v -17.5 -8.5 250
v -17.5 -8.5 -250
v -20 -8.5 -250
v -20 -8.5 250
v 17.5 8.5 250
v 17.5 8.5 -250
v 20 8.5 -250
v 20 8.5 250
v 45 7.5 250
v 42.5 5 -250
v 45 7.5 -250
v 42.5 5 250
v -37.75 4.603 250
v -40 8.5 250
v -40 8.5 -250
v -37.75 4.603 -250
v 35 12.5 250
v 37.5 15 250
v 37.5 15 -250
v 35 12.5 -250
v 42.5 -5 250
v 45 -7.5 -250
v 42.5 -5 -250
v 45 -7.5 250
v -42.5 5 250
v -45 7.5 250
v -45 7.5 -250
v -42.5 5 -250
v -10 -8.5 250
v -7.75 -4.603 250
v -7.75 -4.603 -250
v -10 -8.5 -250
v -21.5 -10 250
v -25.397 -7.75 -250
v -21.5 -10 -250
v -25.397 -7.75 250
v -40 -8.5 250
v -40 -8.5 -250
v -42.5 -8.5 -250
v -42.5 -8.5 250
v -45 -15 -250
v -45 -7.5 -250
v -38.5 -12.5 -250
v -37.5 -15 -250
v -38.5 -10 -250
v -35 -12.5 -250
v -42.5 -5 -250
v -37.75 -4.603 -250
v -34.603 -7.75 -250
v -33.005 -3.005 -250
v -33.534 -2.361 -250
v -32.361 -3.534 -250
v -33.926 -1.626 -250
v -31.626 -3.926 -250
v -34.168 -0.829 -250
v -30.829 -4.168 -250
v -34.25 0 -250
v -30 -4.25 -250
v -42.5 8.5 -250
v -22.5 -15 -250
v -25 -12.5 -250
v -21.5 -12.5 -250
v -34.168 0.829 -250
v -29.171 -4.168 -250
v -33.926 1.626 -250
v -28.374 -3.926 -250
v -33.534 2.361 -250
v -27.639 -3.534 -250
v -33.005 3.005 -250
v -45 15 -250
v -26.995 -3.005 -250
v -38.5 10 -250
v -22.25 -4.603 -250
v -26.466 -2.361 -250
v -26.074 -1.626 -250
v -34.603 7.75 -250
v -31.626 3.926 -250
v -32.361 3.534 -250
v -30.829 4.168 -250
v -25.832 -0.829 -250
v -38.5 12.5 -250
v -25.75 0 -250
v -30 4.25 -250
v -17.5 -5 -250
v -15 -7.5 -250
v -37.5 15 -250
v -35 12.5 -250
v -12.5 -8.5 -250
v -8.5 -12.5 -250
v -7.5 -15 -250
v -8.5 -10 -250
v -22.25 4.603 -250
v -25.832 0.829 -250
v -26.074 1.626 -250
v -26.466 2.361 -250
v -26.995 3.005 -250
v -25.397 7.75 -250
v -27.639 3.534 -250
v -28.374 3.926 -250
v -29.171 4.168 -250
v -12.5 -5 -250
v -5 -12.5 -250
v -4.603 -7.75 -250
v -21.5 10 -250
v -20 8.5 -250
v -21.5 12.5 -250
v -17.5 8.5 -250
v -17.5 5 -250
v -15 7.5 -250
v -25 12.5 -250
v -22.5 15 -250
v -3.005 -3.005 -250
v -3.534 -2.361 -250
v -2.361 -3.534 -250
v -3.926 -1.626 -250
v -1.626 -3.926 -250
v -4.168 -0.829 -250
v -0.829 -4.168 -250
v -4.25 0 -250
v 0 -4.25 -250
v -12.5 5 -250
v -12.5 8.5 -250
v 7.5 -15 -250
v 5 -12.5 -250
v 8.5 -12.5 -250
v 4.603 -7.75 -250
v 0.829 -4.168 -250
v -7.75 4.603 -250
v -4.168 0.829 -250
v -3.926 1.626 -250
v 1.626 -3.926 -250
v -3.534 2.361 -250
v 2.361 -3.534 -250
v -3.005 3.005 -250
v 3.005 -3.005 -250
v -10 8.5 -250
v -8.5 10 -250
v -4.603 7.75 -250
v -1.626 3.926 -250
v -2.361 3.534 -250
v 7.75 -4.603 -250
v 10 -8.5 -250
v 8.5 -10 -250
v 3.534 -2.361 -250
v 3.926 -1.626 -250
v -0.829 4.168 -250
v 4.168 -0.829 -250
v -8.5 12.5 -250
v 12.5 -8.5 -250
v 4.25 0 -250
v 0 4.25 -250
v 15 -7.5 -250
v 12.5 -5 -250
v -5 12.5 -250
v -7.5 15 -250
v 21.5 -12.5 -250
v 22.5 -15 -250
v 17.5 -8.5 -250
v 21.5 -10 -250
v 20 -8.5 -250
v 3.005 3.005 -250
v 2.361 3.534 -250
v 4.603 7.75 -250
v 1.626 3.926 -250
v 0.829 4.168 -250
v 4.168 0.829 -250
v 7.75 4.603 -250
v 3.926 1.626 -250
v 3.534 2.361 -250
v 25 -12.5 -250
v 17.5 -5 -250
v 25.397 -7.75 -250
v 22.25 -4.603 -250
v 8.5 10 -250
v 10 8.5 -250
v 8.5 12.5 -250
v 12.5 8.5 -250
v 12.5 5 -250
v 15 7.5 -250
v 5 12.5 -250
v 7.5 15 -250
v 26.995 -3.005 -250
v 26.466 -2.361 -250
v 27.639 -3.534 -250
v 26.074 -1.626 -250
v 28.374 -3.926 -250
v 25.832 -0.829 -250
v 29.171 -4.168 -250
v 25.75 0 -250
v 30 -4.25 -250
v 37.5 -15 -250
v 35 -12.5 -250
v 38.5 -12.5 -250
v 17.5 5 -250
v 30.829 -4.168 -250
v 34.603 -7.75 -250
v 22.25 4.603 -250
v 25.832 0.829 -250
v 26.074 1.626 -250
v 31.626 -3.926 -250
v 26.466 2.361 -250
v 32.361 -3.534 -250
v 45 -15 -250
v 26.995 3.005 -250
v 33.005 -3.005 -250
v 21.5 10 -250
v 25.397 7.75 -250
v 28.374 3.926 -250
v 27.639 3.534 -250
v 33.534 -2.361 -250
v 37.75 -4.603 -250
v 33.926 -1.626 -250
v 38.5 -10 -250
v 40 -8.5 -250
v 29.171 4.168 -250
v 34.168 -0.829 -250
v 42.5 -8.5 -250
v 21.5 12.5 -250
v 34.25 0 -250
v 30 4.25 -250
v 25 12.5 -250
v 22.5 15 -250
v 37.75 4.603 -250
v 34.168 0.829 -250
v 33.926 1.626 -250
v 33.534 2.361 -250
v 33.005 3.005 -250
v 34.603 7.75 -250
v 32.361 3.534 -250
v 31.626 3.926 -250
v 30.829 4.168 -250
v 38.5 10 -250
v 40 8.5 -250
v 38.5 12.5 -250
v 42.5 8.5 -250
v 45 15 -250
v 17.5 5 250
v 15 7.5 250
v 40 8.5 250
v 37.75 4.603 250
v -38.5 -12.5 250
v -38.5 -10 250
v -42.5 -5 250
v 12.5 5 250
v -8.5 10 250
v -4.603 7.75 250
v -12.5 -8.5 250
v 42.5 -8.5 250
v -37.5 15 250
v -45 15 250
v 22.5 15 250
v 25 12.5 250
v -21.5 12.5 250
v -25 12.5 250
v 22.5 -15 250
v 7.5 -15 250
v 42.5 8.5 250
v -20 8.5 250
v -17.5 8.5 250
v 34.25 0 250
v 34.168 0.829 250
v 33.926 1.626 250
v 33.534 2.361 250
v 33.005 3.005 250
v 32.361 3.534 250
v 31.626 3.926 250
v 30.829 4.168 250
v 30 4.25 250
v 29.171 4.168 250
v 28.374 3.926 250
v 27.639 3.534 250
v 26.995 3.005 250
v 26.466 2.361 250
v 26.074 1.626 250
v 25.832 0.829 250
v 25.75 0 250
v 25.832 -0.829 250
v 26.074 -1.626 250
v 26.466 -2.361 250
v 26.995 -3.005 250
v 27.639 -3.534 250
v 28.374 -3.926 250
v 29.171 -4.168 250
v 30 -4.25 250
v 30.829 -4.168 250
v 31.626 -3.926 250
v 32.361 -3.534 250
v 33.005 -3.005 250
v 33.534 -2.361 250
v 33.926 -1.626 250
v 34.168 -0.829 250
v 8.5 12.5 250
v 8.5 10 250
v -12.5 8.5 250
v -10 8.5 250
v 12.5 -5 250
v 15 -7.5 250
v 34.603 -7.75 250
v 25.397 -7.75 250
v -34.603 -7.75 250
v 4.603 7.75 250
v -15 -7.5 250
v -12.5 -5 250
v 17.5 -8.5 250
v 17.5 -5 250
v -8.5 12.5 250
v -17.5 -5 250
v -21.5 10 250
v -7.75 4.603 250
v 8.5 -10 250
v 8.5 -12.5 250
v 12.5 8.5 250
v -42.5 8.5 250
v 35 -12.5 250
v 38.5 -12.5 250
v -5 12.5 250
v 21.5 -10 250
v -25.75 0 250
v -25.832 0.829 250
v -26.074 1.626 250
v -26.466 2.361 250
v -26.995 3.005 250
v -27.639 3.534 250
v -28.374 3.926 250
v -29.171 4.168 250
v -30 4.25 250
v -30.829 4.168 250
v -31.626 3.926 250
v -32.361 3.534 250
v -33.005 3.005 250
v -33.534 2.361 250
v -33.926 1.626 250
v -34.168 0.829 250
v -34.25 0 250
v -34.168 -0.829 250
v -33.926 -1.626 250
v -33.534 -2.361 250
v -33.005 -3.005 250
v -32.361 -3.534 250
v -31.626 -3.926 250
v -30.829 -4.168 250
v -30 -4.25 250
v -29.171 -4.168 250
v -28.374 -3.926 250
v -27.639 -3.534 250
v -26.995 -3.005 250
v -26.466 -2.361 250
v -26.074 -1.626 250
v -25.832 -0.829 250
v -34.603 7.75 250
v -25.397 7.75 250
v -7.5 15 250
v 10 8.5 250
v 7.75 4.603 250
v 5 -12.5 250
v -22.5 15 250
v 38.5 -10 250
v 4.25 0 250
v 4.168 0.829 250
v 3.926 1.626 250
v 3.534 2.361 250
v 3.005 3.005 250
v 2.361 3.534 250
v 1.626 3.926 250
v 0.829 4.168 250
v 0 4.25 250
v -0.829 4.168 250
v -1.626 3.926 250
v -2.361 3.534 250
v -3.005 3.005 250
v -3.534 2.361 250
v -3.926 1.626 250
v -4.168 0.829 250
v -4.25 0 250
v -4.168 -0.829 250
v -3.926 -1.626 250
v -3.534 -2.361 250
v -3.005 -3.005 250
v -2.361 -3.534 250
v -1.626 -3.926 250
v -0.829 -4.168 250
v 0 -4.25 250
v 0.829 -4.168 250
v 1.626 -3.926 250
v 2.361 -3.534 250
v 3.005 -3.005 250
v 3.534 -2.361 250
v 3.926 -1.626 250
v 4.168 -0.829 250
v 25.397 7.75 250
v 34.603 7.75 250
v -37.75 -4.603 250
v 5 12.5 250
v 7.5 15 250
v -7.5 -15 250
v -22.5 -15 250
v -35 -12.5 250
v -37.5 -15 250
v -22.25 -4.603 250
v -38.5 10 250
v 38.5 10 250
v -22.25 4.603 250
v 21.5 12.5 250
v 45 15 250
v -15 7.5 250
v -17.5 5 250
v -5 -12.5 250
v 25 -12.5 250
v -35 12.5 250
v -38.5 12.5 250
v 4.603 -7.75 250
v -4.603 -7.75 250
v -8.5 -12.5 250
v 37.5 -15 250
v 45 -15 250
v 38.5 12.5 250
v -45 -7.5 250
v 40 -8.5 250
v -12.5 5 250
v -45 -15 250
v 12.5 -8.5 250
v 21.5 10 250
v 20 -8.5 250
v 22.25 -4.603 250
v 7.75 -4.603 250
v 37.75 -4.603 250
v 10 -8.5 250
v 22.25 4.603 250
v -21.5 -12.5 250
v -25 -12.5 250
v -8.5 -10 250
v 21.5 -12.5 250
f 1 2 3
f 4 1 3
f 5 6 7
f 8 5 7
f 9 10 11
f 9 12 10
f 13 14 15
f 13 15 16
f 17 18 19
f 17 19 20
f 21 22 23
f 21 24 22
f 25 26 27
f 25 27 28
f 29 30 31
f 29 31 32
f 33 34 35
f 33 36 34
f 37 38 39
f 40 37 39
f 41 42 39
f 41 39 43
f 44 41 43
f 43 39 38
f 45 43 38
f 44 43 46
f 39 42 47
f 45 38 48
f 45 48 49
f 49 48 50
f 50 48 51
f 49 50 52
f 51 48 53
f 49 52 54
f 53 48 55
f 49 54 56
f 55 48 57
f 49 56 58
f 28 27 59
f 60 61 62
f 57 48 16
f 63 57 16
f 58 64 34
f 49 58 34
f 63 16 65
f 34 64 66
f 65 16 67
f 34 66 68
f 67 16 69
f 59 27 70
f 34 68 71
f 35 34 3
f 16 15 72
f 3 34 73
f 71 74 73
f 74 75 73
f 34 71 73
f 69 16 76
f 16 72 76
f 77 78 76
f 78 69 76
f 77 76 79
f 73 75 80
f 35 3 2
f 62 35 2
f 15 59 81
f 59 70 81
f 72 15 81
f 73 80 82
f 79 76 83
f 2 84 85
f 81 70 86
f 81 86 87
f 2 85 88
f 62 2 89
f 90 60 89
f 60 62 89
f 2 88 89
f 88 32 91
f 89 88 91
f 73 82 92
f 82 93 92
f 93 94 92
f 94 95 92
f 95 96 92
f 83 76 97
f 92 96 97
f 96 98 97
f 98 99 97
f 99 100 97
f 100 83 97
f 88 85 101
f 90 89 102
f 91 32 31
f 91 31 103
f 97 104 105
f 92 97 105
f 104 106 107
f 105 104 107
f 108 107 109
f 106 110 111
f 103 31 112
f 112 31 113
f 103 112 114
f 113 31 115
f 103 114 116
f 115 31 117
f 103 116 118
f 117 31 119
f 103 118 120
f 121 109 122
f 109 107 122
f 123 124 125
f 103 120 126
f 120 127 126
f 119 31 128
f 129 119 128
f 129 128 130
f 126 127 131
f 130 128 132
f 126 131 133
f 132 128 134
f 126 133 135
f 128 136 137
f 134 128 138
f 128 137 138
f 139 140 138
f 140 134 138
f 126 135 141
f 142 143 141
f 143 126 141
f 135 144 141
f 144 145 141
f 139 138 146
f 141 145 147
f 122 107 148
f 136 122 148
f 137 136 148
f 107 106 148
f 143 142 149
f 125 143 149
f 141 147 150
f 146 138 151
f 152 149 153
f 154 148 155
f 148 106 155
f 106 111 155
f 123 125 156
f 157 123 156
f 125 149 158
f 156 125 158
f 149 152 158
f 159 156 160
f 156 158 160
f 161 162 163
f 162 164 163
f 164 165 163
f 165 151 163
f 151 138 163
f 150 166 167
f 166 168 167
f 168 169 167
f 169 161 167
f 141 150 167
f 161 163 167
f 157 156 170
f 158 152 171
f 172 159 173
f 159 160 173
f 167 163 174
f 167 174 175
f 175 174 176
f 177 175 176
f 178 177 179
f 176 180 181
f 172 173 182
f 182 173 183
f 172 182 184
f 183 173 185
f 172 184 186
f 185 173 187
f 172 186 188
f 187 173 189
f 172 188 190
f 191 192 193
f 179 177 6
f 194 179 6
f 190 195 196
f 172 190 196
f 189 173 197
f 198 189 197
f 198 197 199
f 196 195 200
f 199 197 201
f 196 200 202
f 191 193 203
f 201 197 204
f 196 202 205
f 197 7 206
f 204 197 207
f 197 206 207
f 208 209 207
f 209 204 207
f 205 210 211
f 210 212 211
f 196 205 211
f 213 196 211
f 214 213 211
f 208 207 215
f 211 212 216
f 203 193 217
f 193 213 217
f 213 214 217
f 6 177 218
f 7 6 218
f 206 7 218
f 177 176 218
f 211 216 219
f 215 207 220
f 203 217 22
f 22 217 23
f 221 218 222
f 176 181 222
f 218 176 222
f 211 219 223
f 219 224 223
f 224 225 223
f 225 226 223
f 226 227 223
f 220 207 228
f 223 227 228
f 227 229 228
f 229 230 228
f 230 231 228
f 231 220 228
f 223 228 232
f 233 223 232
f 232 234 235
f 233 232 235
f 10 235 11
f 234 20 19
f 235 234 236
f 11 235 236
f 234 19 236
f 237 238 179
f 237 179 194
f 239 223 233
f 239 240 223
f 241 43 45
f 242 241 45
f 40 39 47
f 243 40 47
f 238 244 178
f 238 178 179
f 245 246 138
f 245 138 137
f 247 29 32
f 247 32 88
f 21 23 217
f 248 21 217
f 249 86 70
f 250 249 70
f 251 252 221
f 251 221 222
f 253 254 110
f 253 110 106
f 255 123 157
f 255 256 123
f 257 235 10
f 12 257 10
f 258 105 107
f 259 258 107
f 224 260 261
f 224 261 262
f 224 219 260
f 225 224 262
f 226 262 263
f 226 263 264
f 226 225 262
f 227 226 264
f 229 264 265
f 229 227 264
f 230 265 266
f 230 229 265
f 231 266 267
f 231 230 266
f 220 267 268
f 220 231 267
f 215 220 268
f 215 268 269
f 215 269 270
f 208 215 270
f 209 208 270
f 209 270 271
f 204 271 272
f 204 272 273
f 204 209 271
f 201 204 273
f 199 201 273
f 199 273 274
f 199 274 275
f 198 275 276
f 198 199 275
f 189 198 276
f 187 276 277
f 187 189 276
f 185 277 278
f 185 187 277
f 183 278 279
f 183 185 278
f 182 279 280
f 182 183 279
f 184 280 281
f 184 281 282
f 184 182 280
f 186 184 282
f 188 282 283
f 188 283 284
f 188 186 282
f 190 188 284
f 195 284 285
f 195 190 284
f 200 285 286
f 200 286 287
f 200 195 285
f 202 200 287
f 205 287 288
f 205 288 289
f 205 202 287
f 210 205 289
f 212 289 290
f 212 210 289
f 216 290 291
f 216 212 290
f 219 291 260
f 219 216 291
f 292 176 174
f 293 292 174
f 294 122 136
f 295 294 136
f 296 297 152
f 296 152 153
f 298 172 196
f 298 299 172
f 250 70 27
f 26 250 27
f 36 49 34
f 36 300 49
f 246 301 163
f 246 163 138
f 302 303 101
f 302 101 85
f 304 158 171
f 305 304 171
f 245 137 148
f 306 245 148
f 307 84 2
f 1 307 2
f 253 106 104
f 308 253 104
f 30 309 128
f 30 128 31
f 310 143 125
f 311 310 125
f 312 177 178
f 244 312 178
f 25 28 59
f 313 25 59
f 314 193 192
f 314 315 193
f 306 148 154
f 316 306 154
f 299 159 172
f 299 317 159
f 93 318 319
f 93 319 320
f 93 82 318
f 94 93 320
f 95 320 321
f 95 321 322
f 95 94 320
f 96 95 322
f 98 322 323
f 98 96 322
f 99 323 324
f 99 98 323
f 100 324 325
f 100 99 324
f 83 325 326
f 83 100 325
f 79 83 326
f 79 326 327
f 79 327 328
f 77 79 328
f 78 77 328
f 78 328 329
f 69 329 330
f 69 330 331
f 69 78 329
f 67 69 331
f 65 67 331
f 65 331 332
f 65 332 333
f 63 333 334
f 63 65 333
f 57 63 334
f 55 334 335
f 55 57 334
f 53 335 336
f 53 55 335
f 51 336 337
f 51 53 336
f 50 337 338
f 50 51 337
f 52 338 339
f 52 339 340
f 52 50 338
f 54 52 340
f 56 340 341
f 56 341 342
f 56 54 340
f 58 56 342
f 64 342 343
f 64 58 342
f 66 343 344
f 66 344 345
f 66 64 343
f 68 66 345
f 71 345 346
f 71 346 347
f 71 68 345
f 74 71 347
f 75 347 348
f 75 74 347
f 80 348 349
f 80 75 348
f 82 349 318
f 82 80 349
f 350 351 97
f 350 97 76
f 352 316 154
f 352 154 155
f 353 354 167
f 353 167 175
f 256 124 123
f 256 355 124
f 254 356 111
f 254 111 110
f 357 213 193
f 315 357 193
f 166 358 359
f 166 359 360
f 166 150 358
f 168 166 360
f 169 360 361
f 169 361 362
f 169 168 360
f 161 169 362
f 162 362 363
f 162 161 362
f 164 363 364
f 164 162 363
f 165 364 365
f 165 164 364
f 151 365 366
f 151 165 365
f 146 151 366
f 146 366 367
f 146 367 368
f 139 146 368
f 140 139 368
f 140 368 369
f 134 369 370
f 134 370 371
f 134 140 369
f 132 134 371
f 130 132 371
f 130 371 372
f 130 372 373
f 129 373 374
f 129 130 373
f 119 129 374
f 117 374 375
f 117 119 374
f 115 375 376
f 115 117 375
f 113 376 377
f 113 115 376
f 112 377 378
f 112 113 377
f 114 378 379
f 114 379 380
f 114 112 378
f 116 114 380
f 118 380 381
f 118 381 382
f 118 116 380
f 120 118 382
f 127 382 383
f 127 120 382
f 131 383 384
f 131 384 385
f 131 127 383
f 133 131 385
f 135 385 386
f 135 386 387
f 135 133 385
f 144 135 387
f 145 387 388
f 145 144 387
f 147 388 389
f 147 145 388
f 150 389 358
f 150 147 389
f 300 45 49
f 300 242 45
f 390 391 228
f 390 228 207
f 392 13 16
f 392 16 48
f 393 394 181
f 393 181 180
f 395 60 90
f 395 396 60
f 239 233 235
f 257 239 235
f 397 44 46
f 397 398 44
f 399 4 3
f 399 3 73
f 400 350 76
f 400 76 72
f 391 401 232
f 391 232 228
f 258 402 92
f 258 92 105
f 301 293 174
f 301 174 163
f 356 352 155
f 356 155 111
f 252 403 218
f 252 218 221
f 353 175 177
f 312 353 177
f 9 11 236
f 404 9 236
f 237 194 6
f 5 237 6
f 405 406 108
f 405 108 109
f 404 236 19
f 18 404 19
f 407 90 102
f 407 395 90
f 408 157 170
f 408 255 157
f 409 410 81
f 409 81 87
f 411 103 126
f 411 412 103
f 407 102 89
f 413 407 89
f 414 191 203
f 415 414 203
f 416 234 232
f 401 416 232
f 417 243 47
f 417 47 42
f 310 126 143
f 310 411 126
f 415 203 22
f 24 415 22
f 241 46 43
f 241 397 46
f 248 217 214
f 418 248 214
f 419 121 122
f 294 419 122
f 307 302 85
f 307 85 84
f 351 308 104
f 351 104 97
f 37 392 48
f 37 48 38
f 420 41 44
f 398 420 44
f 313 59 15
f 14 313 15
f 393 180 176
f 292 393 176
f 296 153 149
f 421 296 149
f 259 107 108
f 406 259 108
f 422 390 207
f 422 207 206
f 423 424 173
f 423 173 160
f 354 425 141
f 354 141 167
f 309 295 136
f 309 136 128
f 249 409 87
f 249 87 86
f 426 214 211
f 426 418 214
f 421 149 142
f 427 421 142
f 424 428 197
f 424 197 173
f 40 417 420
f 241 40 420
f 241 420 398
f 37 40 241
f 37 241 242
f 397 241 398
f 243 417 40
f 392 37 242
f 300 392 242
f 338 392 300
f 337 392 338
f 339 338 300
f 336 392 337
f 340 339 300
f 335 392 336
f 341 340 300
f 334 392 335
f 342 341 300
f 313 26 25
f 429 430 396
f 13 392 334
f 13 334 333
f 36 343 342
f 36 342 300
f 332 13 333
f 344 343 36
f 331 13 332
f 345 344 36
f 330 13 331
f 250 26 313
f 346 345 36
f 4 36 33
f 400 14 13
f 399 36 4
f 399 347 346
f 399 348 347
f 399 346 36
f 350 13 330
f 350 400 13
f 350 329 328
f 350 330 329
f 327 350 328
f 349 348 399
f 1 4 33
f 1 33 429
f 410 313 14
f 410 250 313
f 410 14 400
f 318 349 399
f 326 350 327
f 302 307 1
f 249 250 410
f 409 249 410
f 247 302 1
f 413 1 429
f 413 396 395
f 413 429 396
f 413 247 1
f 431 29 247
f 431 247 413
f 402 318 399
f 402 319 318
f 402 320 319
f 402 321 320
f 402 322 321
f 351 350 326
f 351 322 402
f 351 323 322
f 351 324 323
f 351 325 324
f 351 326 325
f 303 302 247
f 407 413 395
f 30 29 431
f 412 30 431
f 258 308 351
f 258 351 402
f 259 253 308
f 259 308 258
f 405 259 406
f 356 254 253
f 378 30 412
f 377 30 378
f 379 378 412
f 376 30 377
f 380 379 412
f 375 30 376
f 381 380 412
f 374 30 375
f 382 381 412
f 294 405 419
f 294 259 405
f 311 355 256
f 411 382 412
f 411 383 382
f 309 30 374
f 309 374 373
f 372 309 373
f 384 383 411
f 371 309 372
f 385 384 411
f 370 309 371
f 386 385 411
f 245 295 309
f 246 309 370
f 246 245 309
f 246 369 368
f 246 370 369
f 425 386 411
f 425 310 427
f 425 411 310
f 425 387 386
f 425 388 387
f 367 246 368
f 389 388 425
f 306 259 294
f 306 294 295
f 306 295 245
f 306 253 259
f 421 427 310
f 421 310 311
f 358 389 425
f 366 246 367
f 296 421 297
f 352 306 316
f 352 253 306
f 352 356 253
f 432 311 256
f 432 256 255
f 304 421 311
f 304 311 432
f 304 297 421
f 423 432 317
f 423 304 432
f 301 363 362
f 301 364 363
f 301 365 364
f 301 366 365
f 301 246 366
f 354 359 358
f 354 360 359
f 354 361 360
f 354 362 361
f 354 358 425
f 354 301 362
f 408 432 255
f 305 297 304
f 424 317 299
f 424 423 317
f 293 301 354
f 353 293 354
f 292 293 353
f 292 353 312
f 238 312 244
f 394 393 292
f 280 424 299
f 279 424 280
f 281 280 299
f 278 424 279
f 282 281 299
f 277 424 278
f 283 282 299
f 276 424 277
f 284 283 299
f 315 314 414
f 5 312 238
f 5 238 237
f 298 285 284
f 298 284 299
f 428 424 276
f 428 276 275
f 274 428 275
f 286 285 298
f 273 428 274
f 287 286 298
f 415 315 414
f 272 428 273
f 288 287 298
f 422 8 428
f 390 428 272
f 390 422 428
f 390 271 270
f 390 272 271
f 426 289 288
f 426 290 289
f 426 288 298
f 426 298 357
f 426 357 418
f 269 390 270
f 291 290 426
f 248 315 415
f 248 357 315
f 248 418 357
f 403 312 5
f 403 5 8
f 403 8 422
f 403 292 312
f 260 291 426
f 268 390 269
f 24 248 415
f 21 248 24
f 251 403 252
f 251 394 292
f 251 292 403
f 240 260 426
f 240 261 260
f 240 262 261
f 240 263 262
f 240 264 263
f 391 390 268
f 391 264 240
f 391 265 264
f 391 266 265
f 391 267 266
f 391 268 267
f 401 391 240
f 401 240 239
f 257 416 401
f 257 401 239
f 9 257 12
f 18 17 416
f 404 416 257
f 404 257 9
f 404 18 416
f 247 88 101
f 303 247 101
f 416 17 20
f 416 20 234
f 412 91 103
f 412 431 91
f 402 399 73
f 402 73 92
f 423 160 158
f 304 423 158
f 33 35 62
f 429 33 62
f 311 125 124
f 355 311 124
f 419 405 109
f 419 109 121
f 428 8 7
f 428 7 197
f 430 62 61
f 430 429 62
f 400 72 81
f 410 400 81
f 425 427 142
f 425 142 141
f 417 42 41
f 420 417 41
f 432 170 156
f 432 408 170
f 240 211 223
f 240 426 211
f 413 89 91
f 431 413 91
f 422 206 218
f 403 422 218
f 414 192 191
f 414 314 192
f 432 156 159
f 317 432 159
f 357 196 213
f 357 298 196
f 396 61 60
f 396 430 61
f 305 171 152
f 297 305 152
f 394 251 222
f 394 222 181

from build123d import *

# Parameters (mm, degrees)
SKETCH1_R           = 4.25
BOSS_EXTRUDE1_DEPTH = 250


with BuildPart() as part:
    # Sketch1 → Boss-Extrude1 (new, symmetric)
    with BuildSketch(Plane.XY):
        Polygon((45, 7.5), (45, 15), (37.5, 15), (35, 12.5), (38.5, 12.5), (38.5, 10), (34.602885683, 7.75), (25.397114317, 7.75), (21.5, 10), (21.5, 12.5), (25, 12.5), (22.5, 15), (7.5, 15), (5, 12.5), (8.5, 12.5), (8.5, 10), (4.602885683, 7.75), (-4.602885683, 7.75), (-8.5, 10), (-8.5, 12.5), (-5, 12.5), (-7.5, 15), (-22.5, 15), (-25, 12.5), (-21.5, 12.5), (-21.5, 10), (-25.397114317, 7.75), (-34.602885683, 7.75), (-38.5, 10), (-38.5, 12.5), (-35, 12.5), (-37.5, 15), (-45, 15), (-45, 7.5), (-42.5, 5), (-42.5, 8.5), (-40, 8.5), (-37.75, 4.602885683), (-37.75, -4.602885683), (-40, -8.5), (-42.5, -8.5), (-42.5, -5), (-45, -7.5), (-45, -15), (-37.5, -15), (-35, -12.5), (-38.5, -12.5), (-38.5, -10), (-34.602885683, -7.75), (-25.397114317, -7.75), (-21.5, -10), (-21.5, -12.5), (-25, -12.5), (-22.5, -15), (-7.5, -15), (-5, -12.5), (-8.5, -12.5), (-8.5, -10), (-4.602885683, -7.75), (4.602885683, -7.75), (8.5, -10), (8.5, -12.5), (5, -12.5), (7.5, -15), (22.5, -15), (25, -12.5), (21.5, -12.5), (21.5, -10), (25.397114317, -7.75), (34.602885683, -7.75), (38.5, -10), (38.5, -12.5), (35, -12.5), (37.5, -15), (45, -15), (45, -7.5), (42.5, -5), (42.5, -8.5), (40, -8.5), (37.75, -4.602885683), (37.75, 4.602885683), (40, 8.5), (42.5, 8.5), (42.5, 5), align=None)
        with Locations((-30, 0)):
            Circle(SKETCH1_R, mode=Mode.SUBTRACT)
        Polygon((-17.5, 8.5), (-17.5, 5), (-15, 7.5), (-12.5, 5), (-12.5, 8.5), (-10, 8.5), (-7.75, 4.602885683), (-7.75, -4.602885683), (-10, -8.5), (-12.5, -8.5), (-12.5, -5), (-15, -7.5), (-17.5, -5), (-17.5, -8.5), (-20, -8.5), (-22.25, -4.602885683), (-22.25, 4.602885683), (-20, 8.5), align=None, mode=Mode.SUBTRACT)
        Circle(SKETCH1_R, mode=Mode.SUBTRACT)
        Polygon((15, 7.5), (17.5, 5), (17.5, 8.5), (20, 8.5), (22.25, 4.602885683), (22.25, -4.602885683), (20, -8.5), (17.5, -8.5), (17.5, -5), (15, -7.5), (12.5, -5), (12.5, -8.5), (10, -8.5), (7.75, -4.602885683), (7.75, 4.602885683), (10, 8.5), (12.5, 8.5), (12.5, 5), align=None, mode=Mode.SUBTRACT)
        with Locations((30, 0)):
            Circle(SKETCH1_R, mode=Mode.SUBTRACT)
    extrude(amount=BOSS_EXTRUDE1_DEPTH, both=True)


solid = part.part
